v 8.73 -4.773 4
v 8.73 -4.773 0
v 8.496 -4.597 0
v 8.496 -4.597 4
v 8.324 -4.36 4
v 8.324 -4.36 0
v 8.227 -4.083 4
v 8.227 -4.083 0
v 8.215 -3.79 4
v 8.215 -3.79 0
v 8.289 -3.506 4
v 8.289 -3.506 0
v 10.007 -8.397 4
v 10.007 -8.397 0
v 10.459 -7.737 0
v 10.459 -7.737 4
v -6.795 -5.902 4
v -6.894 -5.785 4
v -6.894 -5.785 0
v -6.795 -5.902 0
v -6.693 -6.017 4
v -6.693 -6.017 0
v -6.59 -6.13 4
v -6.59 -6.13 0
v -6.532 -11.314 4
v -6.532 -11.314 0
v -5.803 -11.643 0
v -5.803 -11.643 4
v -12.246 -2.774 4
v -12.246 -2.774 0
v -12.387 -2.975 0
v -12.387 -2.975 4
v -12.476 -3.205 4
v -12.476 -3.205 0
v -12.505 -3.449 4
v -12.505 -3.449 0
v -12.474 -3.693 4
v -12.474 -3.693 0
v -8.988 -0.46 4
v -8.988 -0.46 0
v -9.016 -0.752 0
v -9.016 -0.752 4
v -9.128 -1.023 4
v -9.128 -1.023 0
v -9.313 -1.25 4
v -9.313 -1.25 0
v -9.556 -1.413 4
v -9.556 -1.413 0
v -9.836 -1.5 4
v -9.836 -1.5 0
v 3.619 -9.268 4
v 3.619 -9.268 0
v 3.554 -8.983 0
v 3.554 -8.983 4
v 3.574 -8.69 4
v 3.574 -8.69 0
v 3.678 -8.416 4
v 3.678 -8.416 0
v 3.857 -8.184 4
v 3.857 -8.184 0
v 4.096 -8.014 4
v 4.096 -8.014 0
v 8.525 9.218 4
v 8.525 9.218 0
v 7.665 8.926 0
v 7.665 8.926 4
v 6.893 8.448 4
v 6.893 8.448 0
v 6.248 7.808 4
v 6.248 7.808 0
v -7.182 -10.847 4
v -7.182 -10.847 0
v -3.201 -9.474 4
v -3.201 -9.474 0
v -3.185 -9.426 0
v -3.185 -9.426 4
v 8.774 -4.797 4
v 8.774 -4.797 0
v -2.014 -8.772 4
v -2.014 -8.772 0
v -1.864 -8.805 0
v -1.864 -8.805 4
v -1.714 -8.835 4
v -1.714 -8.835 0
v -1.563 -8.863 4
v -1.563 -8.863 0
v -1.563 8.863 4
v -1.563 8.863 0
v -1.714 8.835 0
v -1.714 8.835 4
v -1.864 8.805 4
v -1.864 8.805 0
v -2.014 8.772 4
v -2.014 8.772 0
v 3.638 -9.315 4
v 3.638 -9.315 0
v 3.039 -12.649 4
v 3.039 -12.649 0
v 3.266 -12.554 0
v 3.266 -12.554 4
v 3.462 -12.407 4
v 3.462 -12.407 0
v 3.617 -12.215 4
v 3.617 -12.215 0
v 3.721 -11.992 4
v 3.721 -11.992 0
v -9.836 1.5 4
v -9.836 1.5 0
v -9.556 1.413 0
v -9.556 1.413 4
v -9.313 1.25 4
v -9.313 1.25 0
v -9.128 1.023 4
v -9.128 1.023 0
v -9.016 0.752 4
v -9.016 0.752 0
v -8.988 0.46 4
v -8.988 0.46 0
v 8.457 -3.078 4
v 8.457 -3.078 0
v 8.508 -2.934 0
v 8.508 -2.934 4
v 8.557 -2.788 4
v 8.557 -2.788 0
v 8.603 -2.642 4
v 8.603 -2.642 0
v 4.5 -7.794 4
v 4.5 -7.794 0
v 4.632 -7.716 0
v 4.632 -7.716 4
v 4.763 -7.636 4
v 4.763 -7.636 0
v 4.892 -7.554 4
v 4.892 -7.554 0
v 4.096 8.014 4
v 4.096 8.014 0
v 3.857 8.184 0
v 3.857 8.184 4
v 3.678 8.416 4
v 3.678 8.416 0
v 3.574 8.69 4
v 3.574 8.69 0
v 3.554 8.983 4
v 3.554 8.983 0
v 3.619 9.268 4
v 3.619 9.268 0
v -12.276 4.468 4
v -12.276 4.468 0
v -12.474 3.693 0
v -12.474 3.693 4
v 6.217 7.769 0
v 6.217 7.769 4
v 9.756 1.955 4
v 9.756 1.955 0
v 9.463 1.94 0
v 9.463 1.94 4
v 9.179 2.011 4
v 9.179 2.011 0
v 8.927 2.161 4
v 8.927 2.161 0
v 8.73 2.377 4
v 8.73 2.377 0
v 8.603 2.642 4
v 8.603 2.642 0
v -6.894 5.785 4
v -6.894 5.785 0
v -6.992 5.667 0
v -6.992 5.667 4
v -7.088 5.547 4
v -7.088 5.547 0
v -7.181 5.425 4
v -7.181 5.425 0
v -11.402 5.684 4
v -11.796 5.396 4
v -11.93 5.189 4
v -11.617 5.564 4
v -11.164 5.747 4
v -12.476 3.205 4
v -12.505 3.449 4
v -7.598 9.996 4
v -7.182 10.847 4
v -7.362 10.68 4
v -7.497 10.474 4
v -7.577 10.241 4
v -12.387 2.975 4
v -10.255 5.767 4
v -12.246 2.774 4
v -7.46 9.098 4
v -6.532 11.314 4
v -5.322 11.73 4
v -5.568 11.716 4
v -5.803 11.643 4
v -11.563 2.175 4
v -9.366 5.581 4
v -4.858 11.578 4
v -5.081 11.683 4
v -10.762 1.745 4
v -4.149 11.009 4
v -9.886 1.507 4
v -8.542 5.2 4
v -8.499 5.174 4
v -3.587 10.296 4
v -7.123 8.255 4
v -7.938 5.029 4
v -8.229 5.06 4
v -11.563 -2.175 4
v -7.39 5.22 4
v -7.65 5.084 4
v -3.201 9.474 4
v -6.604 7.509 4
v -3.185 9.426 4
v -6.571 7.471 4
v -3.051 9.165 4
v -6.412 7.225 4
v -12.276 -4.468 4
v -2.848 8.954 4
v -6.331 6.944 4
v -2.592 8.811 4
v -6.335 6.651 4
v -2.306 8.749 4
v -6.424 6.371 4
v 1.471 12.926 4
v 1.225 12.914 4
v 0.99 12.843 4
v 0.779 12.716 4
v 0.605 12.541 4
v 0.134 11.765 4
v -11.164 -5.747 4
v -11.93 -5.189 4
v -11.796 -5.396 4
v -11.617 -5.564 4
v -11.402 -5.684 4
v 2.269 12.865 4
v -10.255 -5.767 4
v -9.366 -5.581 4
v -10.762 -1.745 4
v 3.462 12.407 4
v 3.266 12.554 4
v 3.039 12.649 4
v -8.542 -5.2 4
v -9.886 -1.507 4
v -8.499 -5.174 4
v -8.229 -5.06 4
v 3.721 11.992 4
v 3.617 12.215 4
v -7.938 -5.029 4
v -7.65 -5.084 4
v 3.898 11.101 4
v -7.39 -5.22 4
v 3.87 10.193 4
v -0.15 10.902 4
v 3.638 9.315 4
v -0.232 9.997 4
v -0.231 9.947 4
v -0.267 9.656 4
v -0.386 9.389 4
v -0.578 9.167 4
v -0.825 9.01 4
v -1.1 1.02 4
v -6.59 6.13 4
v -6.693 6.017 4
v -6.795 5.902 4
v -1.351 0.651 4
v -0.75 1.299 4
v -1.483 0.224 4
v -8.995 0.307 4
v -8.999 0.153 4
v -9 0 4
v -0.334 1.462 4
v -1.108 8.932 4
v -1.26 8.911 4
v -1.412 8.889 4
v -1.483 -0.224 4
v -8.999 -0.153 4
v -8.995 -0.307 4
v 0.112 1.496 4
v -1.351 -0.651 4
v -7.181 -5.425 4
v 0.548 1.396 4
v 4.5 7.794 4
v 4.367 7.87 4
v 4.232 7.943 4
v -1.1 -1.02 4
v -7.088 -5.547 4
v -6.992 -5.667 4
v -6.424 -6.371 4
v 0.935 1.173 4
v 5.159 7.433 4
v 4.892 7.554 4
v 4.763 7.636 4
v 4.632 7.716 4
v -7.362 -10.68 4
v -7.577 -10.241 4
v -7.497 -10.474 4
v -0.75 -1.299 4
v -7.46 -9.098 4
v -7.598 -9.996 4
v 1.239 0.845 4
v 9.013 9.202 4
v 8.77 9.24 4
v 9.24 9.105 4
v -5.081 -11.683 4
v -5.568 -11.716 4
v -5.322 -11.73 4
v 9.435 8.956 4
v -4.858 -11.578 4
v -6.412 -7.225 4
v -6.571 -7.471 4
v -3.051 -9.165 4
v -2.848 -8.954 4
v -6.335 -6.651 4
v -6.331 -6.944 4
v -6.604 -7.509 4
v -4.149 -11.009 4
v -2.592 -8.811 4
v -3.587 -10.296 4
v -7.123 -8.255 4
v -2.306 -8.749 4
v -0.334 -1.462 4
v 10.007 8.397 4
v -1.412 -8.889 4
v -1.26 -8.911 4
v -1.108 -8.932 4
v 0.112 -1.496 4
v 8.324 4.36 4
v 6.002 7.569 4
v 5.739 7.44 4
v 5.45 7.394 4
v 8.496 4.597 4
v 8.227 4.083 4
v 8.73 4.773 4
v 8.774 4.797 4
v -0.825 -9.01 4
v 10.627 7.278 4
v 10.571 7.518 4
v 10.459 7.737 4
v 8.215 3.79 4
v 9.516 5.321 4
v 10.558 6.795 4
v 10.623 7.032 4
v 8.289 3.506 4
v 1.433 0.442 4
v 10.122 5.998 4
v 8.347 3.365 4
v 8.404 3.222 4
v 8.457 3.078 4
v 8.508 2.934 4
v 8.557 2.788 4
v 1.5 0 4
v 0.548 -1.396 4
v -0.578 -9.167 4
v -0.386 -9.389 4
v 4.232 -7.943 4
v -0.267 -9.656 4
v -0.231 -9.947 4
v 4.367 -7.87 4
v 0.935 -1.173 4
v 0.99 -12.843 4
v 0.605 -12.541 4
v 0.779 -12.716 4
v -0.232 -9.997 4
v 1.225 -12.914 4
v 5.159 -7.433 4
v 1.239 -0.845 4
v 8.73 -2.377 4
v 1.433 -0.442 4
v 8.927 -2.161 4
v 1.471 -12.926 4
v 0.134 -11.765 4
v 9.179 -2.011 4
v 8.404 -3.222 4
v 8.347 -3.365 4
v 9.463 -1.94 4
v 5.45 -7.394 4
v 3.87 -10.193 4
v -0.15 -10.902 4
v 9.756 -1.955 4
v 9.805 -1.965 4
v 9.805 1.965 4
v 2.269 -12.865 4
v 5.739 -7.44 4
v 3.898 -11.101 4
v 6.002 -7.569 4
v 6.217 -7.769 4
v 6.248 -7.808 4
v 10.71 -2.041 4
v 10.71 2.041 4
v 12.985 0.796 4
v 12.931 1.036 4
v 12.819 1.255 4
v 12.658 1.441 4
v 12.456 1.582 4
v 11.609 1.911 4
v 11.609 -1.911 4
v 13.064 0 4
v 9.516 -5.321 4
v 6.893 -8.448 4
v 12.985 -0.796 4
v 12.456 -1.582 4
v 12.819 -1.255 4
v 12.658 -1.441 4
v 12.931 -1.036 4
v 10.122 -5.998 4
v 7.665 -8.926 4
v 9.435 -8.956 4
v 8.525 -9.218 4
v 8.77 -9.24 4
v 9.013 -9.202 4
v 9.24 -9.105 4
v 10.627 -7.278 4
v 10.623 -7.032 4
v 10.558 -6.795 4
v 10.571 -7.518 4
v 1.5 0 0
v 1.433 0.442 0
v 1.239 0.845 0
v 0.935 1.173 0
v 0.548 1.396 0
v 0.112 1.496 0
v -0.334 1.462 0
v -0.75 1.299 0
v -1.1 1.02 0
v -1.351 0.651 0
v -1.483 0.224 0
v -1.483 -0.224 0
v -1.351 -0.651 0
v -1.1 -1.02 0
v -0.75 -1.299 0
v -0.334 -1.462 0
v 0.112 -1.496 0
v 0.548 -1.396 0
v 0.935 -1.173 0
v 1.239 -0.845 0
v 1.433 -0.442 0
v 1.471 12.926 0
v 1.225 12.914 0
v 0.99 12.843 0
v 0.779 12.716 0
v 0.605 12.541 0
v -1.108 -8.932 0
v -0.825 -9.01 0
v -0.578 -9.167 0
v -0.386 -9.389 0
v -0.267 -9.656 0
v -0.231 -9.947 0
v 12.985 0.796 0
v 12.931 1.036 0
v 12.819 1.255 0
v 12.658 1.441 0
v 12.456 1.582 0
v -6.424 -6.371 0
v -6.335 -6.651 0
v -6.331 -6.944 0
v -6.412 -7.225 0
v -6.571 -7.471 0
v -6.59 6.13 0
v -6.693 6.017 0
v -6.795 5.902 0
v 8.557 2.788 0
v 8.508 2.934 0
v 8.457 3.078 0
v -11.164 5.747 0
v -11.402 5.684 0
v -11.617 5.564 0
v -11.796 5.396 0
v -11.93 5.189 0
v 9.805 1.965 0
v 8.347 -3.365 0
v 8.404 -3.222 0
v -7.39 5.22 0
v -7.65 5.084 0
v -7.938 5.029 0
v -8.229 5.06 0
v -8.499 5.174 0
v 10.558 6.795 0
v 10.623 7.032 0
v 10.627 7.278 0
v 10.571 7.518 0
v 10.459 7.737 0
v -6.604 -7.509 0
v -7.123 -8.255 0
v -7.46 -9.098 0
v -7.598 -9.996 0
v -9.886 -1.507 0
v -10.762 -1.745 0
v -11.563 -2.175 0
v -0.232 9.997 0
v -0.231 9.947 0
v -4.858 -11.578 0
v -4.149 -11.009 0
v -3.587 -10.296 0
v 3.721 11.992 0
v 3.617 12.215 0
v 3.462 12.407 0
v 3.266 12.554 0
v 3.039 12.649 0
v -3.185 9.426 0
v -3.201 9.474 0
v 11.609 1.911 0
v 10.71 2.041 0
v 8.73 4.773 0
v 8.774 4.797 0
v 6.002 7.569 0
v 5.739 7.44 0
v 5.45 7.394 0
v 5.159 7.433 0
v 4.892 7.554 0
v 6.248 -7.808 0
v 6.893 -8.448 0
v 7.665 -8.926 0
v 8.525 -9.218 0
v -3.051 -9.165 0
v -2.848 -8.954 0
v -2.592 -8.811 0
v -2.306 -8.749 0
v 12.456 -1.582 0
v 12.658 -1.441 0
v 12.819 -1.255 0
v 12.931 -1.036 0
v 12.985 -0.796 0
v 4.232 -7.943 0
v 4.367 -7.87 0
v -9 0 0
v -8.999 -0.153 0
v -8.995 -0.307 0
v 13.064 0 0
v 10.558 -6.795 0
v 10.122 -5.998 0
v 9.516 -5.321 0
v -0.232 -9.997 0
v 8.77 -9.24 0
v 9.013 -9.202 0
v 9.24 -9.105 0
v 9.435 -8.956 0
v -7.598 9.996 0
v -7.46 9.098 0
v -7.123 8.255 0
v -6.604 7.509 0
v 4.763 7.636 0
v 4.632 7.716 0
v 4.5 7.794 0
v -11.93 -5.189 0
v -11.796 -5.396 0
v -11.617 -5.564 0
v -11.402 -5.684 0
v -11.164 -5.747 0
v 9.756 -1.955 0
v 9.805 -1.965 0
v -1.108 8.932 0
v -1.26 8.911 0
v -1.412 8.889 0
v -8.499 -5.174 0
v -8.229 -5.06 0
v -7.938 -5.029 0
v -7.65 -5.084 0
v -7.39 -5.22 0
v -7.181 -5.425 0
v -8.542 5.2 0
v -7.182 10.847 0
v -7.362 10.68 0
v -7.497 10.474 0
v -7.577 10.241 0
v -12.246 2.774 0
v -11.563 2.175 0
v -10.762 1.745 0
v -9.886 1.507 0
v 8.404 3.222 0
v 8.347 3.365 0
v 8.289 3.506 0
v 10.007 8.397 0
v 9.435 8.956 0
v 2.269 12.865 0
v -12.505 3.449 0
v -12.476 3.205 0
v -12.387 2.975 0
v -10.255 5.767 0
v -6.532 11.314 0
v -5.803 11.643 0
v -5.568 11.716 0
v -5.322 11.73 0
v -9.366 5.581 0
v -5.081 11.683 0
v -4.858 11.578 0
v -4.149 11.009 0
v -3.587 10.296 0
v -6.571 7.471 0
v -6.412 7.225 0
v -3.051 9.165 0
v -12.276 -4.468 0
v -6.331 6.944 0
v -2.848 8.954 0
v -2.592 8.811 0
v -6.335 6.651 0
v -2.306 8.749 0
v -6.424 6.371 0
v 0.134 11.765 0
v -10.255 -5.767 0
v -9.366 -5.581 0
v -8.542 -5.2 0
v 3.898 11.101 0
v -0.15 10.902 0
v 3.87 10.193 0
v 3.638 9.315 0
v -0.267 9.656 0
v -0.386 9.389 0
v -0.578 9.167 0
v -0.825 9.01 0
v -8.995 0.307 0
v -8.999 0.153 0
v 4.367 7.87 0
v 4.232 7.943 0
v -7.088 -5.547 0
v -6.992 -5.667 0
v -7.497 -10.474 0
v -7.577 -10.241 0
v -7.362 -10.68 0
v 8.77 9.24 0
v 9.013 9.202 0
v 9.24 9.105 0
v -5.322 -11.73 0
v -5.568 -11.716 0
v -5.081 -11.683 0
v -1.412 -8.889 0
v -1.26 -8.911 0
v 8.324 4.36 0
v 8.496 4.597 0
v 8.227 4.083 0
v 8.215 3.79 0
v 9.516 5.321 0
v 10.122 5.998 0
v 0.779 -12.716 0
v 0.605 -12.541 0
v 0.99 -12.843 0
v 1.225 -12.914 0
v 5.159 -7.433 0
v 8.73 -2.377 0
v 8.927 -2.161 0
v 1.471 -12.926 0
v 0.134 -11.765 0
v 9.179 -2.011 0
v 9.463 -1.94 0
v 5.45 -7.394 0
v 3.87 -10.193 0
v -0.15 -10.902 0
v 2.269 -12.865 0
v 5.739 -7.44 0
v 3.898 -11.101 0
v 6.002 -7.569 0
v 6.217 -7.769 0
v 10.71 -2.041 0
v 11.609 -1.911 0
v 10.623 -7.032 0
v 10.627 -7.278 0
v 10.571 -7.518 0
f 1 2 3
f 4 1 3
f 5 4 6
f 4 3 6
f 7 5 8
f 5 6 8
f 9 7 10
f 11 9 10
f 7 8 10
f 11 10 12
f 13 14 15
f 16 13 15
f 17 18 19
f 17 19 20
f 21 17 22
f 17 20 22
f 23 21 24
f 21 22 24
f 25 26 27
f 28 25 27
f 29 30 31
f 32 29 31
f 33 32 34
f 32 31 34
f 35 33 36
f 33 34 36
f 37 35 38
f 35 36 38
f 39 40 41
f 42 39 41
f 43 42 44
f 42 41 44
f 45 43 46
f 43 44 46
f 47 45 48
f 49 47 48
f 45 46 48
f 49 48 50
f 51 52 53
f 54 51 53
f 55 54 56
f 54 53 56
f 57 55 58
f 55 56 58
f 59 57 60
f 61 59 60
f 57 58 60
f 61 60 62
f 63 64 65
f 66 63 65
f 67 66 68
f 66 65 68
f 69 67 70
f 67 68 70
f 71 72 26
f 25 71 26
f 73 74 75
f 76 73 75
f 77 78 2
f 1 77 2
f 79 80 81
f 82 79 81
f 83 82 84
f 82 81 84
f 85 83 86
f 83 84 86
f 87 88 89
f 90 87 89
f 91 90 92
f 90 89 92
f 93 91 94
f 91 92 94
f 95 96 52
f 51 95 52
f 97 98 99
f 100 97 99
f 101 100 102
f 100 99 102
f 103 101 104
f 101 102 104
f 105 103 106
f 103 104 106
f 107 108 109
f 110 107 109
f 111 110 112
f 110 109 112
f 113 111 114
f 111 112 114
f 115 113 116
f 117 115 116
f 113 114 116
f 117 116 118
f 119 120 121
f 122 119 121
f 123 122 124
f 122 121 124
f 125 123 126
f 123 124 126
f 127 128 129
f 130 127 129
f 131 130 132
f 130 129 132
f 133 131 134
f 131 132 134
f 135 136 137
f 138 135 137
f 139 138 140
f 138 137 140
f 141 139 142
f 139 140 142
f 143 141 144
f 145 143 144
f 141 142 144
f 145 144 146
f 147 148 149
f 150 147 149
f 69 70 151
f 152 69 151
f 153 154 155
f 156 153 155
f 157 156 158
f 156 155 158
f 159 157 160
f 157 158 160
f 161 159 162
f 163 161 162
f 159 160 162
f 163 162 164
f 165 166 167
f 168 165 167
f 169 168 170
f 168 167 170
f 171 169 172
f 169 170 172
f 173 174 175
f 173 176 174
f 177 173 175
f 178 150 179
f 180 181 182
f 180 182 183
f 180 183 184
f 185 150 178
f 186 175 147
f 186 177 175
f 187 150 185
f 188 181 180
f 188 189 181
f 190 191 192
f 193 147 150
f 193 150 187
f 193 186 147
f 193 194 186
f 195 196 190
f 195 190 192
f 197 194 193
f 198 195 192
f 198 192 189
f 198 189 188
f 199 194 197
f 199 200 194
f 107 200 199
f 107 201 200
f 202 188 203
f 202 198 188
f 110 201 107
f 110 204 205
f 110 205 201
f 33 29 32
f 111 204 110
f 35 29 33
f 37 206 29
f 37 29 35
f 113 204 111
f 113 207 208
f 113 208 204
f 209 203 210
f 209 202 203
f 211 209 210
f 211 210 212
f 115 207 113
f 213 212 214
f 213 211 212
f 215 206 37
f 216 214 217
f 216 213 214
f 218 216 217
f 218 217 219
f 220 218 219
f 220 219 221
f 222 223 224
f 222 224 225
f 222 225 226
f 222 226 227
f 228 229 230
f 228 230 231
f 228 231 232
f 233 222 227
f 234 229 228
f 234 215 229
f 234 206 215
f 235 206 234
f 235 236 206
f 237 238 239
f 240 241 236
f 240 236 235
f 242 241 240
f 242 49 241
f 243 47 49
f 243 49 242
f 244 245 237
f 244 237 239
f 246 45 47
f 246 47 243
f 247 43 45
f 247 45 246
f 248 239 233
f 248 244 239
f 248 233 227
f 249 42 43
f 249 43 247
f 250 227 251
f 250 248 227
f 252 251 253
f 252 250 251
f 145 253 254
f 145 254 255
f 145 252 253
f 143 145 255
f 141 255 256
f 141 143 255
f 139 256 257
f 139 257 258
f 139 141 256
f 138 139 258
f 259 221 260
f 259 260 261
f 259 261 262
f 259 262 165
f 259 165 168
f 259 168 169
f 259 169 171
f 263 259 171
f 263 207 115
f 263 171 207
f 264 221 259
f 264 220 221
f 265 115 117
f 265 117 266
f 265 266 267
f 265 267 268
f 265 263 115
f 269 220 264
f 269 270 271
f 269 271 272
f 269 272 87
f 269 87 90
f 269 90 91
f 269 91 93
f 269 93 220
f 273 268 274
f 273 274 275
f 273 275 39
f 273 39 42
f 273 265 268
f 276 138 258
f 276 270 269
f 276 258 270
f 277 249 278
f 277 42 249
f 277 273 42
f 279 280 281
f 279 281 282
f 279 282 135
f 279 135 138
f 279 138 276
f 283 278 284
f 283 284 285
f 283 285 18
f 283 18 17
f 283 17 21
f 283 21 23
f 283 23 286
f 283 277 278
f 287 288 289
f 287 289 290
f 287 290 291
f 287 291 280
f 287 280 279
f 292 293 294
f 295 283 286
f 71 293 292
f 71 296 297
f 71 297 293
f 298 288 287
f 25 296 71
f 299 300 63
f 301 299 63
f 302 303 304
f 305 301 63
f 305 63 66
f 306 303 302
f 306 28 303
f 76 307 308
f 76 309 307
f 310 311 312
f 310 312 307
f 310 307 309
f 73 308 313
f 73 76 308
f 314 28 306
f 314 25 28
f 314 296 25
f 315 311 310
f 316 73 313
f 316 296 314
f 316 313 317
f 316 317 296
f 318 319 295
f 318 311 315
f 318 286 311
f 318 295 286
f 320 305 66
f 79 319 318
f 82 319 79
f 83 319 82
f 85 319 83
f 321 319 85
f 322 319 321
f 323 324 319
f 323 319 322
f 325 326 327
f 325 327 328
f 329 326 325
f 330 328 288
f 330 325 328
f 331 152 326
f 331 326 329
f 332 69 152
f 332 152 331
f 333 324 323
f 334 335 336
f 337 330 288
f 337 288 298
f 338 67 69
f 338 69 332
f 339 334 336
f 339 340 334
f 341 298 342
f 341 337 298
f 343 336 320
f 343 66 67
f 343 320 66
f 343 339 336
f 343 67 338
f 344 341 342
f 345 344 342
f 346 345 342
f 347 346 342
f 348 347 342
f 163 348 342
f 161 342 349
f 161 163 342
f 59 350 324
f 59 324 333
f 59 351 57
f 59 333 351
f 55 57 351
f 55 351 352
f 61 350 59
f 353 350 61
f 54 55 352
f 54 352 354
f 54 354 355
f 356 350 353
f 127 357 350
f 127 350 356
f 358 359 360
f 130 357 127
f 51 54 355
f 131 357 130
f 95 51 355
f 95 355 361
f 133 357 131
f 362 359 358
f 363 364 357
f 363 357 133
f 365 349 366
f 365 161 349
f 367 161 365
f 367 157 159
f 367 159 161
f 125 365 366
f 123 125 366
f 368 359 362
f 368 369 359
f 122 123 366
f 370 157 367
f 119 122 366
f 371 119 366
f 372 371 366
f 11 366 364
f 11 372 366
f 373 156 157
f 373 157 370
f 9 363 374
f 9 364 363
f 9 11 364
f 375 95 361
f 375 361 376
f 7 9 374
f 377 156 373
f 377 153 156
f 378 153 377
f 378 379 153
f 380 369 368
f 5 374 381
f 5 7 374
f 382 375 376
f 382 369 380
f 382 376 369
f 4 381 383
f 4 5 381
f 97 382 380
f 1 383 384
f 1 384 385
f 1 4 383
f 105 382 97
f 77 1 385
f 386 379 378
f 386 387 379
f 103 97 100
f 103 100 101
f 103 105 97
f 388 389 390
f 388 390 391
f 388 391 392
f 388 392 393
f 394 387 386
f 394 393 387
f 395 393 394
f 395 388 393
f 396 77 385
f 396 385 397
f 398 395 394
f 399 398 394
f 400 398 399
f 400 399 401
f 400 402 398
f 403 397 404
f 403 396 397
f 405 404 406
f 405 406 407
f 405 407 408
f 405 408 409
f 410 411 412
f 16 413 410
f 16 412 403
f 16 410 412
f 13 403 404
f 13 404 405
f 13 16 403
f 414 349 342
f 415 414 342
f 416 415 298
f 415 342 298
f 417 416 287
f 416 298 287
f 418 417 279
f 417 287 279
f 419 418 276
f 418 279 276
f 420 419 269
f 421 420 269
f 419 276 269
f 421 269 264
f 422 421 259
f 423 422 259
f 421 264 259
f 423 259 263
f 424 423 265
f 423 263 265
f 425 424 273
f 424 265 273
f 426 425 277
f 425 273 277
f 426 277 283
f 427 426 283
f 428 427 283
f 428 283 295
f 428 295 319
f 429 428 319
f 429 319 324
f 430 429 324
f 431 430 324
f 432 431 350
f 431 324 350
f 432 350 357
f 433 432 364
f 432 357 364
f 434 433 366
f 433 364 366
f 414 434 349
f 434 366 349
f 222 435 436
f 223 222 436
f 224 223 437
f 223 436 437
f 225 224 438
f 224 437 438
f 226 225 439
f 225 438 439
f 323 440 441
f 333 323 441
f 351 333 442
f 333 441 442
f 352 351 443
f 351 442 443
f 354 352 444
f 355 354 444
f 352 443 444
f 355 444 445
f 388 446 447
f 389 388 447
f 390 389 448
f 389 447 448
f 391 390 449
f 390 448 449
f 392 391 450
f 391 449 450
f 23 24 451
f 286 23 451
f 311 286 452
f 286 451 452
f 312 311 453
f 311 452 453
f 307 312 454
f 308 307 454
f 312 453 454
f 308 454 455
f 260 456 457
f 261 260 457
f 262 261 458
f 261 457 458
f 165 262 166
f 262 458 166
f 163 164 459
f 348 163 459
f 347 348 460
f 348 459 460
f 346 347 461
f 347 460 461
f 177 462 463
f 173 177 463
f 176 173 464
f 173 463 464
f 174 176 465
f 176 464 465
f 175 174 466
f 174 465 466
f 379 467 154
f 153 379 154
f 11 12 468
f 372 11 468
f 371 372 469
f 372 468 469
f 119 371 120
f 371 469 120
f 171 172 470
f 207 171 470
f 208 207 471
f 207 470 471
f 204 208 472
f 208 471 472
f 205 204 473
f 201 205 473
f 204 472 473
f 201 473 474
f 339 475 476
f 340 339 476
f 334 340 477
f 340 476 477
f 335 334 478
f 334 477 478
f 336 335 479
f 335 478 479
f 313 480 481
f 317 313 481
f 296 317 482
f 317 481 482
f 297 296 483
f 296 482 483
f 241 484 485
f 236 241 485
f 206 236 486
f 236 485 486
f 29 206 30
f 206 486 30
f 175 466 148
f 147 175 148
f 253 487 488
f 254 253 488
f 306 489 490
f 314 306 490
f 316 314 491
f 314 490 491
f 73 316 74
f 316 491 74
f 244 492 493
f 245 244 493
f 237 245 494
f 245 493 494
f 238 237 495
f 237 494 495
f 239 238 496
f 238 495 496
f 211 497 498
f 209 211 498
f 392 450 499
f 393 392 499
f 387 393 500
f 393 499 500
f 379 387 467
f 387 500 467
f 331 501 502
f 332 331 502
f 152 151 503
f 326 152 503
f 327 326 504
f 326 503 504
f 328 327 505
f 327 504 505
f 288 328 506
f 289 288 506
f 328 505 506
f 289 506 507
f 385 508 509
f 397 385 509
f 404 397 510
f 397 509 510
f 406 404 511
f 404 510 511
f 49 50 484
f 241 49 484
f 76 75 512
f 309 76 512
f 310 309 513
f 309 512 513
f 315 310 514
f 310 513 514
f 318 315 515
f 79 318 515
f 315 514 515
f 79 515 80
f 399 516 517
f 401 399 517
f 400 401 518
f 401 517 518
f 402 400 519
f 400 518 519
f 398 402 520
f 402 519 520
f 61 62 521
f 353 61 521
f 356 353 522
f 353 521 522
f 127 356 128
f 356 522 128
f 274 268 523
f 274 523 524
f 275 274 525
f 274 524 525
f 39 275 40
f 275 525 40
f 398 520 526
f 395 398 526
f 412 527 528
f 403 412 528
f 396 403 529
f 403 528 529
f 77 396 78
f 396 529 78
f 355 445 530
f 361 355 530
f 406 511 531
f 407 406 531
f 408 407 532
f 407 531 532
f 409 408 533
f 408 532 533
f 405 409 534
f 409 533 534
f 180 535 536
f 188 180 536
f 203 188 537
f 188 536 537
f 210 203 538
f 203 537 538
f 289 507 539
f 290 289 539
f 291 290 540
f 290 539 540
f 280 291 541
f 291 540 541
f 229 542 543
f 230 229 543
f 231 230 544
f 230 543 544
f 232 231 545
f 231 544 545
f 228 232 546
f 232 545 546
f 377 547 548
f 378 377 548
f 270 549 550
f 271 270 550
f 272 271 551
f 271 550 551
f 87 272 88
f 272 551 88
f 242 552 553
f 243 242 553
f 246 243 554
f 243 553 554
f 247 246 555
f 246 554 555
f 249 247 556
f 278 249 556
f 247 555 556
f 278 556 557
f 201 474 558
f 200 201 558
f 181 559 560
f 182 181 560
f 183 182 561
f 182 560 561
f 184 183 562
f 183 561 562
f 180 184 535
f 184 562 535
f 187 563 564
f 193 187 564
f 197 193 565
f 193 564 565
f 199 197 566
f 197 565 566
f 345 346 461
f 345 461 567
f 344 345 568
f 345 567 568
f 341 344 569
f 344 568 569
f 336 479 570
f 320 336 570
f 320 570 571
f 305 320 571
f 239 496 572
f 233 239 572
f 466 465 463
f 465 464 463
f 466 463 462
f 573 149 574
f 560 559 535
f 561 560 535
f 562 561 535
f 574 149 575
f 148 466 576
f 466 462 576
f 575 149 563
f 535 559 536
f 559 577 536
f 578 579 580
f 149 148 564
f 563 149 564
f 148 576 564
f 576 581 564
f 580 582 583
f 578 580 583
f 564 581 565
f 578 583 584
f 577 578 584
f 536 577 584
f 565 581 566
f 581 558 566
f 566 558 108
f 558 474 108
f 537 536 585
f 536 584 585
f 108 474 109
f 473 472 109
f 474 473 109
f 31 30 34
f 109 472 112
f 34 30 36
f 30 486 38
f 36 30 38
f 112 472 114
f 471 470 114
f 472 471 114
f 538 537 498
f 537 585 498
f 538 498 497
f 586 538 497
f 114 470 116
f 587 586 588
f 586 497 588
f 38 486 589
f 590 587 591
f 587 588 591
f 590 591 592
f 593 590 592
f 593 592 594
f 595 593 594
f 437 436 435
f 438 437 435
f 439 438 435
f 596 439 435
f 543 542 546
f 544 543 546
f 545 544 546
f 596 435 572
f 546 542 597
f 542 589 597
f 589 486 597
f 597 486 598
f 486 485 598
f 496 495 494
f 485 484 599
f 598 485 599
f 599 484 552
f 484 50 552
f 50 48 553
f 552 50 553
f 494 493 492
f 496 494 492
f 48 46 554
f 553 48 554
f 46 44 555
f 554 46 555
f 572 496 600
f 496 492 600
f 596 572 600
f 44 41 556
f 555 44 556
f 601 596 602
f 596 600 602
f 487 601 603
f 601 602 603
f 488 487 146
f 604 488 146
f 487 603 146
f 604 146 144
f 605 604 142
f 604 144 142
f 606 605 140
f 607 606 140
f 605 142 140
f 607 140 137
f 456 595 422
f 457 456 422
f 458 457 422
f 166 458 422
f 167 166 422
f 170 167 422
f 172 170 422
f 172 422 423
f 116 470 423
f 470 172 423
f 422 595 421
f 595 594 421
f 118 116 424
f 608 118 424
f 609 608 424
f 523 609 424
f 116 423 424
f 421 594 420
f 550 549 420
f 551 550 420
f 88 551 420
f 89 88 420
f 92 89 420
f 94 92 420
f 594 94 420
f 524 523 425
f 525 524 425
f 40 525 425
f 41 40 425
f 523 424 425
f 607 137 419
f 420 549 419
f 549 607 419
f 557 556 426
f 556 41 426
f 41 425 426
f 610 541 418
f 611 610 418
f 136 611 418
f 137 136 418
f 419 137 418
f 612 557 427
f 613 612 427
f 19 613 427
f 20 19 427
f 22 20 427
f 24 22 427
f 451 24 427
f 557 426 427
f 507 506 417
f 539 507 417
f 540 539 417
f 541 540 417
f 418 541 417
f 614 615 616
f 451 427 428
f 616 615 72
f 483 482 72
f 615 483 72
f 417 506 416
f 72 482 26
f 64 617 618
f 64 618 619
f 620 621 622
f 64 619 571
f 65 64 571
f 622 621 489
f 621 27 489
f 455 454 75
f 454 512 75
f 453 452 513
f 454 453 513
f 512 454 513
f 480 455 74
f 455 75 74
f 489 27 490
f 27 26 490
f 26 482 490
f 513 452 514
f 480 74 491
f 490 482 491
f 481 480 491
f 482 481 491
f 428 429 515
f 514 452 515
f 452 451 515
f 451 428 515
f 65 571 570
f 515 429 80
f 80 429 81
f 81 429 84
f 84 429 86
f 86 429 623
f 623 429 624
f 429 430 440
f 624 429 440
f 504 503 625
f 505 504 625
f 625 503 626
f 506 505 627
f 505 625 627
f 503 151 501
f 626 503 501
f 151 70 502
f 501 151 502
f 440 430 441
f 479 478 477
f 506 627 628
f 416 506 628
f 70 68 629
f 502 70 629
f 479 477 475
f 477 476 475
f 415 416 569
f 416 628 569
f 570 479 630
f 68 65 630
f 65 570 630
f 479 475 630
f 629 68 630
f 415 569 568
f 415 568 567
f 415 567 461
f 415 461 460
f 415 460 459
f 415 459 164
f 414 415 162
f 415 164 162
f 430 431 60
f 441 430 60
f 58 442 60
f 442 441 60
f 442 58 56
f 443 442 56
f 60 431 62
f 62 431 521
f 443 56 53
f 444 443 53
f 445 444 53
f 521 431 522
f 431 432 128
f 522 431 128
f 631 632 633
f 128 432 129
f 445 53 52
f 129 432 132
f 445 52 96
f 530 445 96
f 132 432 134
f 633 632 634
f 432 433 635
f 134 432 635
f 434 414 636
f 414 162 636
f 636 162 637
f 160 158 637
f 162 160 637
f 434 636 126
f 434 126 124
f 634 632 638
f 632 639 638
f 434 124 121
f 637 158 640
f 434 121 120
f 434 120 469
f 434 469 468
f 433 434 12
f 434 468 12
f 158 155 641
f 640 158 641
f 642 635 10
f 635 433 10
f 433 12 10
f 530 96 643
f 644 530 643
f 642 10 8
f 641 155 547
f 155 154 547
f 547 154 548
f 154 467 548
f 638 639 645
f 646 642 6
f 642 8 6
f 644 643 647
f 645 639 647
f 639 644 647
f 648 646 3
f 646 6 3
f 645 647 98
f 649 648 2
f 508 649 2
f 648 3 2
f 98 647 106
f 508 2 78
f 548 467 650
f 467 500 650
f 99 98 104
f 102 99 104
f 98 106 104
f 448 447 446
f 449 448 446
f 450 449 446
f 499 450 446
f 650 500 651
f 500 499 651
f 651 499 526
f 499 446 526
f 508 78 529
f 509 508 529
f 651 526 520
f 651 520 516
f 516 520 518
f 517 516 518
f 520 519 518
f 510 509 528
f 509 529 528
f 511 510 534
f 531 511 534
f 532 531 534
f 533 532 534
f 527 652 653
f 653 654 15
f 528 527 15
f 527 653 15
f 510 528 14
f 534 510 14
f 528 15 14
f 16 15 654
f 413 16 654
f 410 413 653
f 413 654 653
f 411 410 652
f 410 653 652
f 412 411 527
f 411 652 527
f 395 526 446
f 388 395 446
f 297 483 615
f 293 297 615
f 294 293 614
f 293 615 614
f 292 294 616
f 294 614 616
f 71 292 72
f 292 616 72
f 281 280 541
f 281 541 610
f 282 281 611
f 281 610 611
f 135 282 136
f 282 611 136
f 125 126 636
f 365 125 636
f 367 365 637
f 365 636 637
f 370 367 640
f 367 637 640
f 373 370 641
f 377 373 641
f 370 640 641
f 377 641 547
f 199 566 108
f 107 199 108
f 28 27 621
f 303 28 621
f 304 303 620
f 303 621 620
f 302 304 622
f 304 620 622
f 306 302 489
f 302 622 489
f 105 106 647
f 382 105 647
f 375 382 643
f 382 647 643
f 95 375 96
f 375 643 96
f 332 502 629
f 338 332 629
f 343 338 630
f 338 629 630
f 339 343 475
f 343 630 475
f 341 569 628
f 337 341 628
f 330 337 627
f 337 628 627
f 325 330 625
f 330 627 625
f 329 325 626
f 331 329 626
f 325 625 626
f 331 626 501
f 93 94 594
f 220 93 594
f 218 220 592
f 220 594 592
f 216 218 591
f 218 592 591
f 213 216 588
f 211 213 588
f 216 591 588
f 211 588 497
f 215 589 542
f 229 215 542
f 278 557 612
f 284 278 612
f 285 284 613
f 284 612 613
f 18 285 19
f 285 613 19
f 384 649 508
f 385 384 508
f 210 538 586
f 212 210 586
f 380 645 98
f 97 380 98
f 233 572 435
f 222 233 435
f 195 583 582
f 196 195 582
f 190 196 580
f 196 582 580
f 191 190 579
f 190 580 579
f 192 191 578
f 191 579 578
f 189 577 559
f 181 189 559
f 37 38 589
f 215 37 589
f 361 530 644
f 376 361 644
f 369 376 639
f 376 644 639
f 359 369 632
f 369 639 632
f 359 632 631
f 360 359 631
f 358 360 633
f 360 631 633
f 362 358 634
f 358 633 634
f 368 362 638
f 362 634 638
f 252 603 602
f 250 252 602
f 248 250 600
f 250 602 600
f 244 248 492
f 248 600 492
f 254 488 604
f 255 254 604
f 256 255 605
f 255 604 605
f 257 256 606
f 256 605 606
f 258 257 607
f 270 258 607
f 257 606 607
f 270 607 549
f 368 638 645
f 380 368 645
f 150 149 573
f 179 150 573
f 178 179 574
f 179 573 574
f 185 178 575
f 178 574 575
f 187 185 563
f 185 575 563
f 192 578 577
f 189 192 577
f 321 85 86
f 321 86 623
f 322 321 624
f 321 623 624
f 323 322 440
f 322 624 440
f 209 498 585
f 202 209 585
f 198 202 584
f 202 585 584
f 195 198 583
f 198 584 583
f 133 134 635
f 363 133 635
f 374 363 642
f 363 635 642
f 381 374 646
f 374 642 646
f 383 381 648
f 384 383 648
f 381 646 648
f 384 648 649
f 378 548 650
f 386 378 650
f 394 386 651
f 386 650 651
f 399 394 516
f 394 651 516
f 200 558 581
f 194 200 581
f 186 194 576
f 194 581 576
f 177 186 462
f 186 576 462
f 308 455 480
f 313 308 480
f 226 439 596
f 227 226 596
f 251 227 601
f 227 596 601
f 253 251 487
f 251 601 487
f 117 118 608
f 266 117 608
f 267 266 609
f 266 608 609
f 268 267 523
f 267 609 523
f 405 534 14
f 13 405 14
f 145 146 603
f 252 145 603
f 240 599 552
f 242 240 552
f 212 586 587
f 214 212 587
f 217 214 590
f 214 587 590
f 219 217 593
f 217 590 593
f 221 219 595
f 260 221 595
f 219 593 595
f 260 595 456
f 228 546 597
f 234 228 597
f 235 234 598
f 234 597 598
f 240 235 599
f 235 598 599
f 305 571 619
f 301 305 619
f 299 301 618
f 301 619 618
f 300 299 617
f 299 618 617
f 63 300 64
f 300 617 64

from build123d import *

# Parameters (mm, degrees)
F1_DEPTH = 4
F2_COUNT = 9
F4_R     = 1.5
F5_DEPTH = 4


with BuildPart() as f1:
    # F0 (on Top) → F1 (new body)
    with BuildSketch(Plane.XY):
        with BuildLine():
            Line((8.305078, 3.467805), (0, 0))
            Line((0, 0), (8.305078, -3.467805))
            ThreePointArc((8.305078, -3.467805), (8.464361, -3.058527), (8.603489, -2.641966))
            ThreePointArc((8.603489, -2.641966), (9.047406, -2.076548), (9.755918, -1.955011))
            Line((9.755918, -1.955011), (9.805066, -1.96486))
            ThreePointArc((9.805066, -1.96486), (11.163417, -2.001728), (12.455768, -1.581844))
            ThreePointArc((12.455768, -1.581844), (12.819329, -1.255462), (12.98487, -0.795791))
            Line((12.98487, -0.795791), (13.06382, 0))
            Line((13.06382, 0), (12.98487, 0.795791))
            ThreePointArc((12.98487, 0.795791), (12.819329, 1.255462), (12.455768, 1.581844))
            ThreePointArc((12.455768, 1.581844), (11.163417, 2.001728), (9.805066, 1.96486))
            Line((9.805066, 1.96486), (9.755918, 1.955011))
            ThreePointArc((9.755918, 1.955011), (9.047406, 2.076548), (8.603489, 2.641966))
            ThreePointArc((8.603489, 2.641966), (8.464361, 3.058527), (8.305078, 3.467805))
        make_face()
    extrude(amount=F1_DEPTH)


with BuildPart() as f2_1:
    # F2: instance of F1
    add(f1.part.rotate(Axis((0, 0, 2), (0, 0, 1)), 1 * 360 / F2_COUNT))


with BuildPart() as f2_2:
    # F2: instance of F1
    add(f1.part.rotate(Axis((0, 0, 2), (0, 0, 1)), 2 * 360 / F2_COUNT))


with BuildPart() as f2_3:
    # F2: instance of F1
    add(f1.part.rotate(Axis((0, 0, 2), (0, 0, 1)), 3 * 360 / F2_COUNT))


with BuildPart() as f2_4:
    # F2: instance of F1
    add(f1.part.rotate(Axis((0, 0, 2), (0, 0, 1)), 4 * 360 / F2_COUNT))


with BuildPart() as f2_5:
    # F2: instance of F1
    add(f1.part.rotate(Axis((0, 0, 2), (0, 0, 1)), 5 * 360 / F2_COUNT))


with BuildPart() as f2_6:
    # F2: instance of F1
    add(f1.part.rotate(Axis((0, 0, 2), (0, 0, 1)), 6 * 360 / F2_COUNT))


with BuildPart() as f2_7:
    # F2: instance of F1
    add(f1.part.rotate(Axis((0, 0, 2), (0, 0, 1)), 7 * 360 / F2_COUNT))


with BuildPart() as f2_8:
    # F2: instance of F1
    add(f1.part.rotate(Axis((0, 0, 2), (0, 0, 1)), 8 * 360 / F2_COUNT))


with BuildPart() as f2_7_1:
    add(f2_7.part)

    # F3: union F2_6, F2_4, F2_5, F1, F2_1, F2_3, F2_2, F2_8
    add(f2_6.part)
    add(f2_4.part)
    add(f2_5.part)
    add(f1.part)
    add(f2_1.part)
    add(f2_3.part)
    add(f2_2.part)
    add(f2_8.part)

    # F4 (on face) → F5 (cut, through all)
    with BuildSketch(Plane.XY.offset(4)):
        Circle(F4_R)
    extrude(amount=-F5_DEPTH, mode=Mode.SUBTRACT)


solid = f2_7_1.part
